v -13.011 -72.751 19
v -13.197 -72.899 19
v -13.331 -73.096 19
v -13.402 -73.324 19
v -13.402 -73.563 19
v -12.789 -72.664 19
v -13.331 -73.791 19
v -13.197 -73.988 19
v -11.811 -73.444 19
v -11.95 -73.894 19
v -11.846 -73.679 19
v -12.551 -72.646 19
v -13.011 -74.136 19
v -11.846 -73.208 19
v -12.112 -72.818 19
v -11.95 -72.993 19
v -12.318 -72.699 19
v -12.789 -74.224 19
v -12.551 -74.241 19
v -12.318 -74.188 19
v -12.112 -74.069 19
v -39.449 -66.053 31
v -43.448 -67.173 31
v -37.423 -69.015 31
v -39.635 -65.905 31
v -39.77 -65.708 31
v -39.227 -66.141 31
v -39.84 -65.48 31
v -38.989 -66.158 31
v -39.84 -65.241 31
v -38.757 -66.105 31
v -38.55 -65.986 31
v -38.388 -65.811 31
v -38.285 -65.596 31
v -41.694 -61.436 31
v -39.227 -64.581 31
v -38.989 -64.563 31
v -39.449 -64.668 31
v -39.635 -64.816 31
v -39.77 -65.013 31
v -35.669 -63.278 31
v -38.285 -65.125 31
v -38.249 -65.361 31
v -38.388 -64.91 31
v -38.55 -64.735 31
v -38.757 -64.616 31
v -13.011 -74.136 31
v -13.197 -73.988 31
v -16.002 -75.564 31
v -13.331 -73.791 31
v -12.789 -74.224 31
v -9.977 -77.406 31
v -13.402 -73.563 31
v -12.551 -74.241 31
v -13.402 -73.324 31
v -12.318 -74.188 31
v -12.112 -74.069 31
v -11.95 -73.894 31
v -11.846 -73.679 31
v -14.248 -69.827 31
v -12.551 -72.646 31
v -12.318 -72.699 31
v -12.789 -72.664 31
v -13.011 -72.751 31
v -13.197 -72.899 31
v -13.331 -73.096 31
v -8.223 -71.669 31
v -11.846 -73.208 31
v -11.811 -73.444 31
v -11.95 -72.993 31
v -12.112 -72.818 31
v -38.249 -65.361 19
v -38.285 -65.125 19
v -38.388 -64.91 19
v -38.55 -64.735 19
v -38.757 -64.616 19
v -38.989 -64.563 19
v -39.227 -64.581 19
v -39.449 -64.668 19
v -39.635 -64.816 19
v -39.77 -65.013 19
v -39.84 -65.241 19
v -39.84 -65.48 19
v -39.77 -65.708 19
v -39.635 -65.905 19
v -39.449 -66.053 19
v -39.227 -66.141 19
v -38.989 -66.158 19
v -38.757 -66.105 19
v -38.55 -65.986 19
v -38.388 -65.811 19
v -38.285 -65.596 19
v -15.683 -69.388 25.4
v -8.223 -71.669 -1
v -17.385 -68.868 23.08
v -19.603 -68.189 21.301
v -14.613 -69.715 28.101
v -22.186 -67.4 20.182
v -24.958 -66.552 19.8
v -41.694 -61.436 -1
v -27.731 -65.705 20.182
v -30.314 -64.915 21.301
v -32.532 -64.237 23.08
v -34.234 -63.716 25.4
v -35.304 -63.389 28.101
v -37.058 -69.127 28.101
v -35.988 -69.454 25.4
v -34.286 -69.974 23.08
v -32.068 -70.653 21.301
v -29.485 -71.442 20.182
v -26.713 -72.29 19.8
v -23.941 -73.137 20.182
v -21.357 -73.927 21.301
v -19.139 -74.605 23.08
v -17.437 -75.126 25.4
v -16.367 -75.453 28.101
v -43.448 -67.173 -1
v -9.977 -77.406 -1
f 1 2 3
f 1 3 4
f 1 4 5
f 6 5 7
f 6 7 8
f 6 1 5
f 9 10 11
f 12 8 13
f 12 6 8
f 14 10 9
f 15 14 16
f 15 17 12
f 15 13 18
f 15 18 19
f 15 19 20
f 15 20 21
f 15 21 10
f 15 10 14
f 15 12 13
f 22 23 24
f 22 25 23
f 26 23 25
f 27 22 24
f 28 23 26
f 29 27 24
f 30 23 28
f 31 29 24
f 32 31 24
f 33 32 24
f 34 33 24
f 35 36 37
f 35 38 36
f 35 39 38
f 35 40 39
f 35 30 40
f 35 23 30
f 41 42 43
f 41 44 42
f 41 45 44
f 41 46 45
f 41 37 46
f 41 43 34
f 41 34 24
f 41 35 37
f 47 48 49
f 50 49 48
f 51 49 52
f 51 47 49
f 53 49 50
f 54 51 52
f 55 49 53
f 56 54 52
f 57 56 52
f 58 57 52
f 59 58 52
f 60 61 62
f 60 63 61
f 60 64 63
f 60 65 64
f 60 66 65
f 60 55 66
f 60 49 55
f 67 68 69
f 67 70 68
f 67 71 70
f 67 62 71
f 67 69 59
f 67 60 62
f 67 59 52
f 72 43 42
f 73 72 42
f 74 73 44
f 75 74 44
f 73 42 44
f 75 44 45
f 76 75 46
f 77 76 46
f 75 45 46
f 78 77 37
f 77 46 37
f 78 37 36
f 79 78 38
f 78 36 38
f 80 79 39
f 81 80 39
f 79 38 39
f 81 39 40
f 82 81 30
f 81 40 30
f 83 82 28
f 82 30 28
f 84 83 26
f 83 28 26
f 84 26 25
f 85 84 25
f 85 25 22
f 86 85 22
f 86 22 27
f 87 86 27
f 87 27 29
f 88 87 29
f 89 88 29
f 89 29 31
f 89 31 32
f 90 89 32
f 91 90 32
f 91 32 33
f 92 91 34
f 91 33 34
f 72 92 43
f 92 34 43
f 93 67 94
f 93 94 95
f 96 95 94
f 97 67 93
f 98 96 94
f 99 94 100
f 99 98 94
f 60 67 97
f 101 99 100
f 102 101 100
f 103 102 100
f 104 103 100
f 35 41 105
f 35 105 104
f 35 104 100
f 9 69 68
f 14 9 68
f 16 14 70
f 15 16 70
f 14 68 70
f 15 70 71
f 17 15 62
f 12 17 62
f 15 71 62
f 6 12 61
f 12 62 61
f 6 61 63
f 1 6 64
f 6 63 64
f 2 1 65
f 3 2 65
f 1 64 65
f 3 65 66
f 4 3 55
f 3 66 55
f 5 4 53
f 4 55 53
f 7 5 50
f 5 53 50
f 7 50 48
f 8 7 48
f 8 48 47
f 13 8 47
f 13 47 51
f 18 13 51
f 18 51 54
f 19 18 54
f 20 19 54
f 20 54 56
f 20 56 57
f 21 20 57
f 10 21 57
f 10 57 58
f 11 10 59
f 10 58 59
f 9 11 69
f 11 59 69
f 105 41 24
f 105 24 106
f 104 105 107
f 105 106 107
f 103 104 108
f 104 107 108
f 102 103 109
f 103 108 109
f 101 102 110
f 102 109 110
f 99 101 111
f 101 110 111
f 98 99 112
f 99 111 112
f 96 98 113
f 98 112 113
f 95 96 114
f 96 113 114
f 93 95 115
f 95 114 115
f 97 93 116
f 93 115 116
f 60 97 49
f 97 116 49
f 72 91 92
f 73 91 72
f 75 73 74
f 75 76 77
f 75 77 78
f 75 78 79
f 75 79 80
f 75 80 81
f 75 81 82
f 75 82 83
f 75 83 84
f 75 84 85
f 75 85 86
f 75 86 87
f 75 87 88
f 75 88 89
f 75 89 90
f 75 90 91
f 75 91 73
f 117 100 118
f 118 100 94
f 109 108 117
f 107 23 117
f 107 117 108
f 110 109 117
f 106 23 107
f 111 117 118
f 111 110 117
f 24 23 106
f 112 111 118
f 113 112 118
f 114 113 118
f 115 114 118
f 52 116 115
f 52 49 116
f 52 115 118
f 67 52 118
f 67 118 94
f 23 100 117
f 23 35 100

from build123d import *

# Parameters (mm, degrees)
PAD005_DEPTH      = 31
PAD005_DEPTH_BACK = 1
SKETCH022_R       = 11.2
POCKET006_DEPTH   = 15.7868758107
SKETCH030_R       = 0.8
POCKET012_DEPTH   = 12


with BuildPart() as part:
    # Sketch017 → Pad005 (new body, two sides)
    with BuildSketch(Plane.XY) as pad005_sk:
        Polygon((-43.4480411338, -67.1734152894), (-9.9773746751, -77.4064249547), (-8.2231444467, -71.6685964189), (-41.6938109054, -61.4355867536), align=None)
    extrude(amount=PAD005_DEPTH)
    extrude(pad005_sk.sketch, amount=-PAD005_DEPTH_BACK)

    # Sketch022 → Pocket006 (cut, through all)
    with BuildSketch(Plane(origin=(-22.4954398558, -73.5792683564, 0), x_dir=(0.956304756, -0.2923717047, 0), z_dir=(-0.2923717047, -0.956304756, 0))):
        with Locations((-4.4099624333, 31)):
            Circle(SKETCH022_R)
    extrude(amount=-POCKET006_DEPTH, mode=Mode.SUBTRACT)

    # Sketch030 → Pocket012 (cut)
    with BuildSketch(Plane.XY.offset(31)):
        with Locations((-12.610661593, -73.443591444)):
            Circle(SKETCH030_R)
        with Locations((-39.0489589627, -65.3605927726)):
            Circle(SKETCH030_R)
    extrude(amount=-POCKET012_DEPTH, mode=Mode.SUBTRACT)


solid = part.part
